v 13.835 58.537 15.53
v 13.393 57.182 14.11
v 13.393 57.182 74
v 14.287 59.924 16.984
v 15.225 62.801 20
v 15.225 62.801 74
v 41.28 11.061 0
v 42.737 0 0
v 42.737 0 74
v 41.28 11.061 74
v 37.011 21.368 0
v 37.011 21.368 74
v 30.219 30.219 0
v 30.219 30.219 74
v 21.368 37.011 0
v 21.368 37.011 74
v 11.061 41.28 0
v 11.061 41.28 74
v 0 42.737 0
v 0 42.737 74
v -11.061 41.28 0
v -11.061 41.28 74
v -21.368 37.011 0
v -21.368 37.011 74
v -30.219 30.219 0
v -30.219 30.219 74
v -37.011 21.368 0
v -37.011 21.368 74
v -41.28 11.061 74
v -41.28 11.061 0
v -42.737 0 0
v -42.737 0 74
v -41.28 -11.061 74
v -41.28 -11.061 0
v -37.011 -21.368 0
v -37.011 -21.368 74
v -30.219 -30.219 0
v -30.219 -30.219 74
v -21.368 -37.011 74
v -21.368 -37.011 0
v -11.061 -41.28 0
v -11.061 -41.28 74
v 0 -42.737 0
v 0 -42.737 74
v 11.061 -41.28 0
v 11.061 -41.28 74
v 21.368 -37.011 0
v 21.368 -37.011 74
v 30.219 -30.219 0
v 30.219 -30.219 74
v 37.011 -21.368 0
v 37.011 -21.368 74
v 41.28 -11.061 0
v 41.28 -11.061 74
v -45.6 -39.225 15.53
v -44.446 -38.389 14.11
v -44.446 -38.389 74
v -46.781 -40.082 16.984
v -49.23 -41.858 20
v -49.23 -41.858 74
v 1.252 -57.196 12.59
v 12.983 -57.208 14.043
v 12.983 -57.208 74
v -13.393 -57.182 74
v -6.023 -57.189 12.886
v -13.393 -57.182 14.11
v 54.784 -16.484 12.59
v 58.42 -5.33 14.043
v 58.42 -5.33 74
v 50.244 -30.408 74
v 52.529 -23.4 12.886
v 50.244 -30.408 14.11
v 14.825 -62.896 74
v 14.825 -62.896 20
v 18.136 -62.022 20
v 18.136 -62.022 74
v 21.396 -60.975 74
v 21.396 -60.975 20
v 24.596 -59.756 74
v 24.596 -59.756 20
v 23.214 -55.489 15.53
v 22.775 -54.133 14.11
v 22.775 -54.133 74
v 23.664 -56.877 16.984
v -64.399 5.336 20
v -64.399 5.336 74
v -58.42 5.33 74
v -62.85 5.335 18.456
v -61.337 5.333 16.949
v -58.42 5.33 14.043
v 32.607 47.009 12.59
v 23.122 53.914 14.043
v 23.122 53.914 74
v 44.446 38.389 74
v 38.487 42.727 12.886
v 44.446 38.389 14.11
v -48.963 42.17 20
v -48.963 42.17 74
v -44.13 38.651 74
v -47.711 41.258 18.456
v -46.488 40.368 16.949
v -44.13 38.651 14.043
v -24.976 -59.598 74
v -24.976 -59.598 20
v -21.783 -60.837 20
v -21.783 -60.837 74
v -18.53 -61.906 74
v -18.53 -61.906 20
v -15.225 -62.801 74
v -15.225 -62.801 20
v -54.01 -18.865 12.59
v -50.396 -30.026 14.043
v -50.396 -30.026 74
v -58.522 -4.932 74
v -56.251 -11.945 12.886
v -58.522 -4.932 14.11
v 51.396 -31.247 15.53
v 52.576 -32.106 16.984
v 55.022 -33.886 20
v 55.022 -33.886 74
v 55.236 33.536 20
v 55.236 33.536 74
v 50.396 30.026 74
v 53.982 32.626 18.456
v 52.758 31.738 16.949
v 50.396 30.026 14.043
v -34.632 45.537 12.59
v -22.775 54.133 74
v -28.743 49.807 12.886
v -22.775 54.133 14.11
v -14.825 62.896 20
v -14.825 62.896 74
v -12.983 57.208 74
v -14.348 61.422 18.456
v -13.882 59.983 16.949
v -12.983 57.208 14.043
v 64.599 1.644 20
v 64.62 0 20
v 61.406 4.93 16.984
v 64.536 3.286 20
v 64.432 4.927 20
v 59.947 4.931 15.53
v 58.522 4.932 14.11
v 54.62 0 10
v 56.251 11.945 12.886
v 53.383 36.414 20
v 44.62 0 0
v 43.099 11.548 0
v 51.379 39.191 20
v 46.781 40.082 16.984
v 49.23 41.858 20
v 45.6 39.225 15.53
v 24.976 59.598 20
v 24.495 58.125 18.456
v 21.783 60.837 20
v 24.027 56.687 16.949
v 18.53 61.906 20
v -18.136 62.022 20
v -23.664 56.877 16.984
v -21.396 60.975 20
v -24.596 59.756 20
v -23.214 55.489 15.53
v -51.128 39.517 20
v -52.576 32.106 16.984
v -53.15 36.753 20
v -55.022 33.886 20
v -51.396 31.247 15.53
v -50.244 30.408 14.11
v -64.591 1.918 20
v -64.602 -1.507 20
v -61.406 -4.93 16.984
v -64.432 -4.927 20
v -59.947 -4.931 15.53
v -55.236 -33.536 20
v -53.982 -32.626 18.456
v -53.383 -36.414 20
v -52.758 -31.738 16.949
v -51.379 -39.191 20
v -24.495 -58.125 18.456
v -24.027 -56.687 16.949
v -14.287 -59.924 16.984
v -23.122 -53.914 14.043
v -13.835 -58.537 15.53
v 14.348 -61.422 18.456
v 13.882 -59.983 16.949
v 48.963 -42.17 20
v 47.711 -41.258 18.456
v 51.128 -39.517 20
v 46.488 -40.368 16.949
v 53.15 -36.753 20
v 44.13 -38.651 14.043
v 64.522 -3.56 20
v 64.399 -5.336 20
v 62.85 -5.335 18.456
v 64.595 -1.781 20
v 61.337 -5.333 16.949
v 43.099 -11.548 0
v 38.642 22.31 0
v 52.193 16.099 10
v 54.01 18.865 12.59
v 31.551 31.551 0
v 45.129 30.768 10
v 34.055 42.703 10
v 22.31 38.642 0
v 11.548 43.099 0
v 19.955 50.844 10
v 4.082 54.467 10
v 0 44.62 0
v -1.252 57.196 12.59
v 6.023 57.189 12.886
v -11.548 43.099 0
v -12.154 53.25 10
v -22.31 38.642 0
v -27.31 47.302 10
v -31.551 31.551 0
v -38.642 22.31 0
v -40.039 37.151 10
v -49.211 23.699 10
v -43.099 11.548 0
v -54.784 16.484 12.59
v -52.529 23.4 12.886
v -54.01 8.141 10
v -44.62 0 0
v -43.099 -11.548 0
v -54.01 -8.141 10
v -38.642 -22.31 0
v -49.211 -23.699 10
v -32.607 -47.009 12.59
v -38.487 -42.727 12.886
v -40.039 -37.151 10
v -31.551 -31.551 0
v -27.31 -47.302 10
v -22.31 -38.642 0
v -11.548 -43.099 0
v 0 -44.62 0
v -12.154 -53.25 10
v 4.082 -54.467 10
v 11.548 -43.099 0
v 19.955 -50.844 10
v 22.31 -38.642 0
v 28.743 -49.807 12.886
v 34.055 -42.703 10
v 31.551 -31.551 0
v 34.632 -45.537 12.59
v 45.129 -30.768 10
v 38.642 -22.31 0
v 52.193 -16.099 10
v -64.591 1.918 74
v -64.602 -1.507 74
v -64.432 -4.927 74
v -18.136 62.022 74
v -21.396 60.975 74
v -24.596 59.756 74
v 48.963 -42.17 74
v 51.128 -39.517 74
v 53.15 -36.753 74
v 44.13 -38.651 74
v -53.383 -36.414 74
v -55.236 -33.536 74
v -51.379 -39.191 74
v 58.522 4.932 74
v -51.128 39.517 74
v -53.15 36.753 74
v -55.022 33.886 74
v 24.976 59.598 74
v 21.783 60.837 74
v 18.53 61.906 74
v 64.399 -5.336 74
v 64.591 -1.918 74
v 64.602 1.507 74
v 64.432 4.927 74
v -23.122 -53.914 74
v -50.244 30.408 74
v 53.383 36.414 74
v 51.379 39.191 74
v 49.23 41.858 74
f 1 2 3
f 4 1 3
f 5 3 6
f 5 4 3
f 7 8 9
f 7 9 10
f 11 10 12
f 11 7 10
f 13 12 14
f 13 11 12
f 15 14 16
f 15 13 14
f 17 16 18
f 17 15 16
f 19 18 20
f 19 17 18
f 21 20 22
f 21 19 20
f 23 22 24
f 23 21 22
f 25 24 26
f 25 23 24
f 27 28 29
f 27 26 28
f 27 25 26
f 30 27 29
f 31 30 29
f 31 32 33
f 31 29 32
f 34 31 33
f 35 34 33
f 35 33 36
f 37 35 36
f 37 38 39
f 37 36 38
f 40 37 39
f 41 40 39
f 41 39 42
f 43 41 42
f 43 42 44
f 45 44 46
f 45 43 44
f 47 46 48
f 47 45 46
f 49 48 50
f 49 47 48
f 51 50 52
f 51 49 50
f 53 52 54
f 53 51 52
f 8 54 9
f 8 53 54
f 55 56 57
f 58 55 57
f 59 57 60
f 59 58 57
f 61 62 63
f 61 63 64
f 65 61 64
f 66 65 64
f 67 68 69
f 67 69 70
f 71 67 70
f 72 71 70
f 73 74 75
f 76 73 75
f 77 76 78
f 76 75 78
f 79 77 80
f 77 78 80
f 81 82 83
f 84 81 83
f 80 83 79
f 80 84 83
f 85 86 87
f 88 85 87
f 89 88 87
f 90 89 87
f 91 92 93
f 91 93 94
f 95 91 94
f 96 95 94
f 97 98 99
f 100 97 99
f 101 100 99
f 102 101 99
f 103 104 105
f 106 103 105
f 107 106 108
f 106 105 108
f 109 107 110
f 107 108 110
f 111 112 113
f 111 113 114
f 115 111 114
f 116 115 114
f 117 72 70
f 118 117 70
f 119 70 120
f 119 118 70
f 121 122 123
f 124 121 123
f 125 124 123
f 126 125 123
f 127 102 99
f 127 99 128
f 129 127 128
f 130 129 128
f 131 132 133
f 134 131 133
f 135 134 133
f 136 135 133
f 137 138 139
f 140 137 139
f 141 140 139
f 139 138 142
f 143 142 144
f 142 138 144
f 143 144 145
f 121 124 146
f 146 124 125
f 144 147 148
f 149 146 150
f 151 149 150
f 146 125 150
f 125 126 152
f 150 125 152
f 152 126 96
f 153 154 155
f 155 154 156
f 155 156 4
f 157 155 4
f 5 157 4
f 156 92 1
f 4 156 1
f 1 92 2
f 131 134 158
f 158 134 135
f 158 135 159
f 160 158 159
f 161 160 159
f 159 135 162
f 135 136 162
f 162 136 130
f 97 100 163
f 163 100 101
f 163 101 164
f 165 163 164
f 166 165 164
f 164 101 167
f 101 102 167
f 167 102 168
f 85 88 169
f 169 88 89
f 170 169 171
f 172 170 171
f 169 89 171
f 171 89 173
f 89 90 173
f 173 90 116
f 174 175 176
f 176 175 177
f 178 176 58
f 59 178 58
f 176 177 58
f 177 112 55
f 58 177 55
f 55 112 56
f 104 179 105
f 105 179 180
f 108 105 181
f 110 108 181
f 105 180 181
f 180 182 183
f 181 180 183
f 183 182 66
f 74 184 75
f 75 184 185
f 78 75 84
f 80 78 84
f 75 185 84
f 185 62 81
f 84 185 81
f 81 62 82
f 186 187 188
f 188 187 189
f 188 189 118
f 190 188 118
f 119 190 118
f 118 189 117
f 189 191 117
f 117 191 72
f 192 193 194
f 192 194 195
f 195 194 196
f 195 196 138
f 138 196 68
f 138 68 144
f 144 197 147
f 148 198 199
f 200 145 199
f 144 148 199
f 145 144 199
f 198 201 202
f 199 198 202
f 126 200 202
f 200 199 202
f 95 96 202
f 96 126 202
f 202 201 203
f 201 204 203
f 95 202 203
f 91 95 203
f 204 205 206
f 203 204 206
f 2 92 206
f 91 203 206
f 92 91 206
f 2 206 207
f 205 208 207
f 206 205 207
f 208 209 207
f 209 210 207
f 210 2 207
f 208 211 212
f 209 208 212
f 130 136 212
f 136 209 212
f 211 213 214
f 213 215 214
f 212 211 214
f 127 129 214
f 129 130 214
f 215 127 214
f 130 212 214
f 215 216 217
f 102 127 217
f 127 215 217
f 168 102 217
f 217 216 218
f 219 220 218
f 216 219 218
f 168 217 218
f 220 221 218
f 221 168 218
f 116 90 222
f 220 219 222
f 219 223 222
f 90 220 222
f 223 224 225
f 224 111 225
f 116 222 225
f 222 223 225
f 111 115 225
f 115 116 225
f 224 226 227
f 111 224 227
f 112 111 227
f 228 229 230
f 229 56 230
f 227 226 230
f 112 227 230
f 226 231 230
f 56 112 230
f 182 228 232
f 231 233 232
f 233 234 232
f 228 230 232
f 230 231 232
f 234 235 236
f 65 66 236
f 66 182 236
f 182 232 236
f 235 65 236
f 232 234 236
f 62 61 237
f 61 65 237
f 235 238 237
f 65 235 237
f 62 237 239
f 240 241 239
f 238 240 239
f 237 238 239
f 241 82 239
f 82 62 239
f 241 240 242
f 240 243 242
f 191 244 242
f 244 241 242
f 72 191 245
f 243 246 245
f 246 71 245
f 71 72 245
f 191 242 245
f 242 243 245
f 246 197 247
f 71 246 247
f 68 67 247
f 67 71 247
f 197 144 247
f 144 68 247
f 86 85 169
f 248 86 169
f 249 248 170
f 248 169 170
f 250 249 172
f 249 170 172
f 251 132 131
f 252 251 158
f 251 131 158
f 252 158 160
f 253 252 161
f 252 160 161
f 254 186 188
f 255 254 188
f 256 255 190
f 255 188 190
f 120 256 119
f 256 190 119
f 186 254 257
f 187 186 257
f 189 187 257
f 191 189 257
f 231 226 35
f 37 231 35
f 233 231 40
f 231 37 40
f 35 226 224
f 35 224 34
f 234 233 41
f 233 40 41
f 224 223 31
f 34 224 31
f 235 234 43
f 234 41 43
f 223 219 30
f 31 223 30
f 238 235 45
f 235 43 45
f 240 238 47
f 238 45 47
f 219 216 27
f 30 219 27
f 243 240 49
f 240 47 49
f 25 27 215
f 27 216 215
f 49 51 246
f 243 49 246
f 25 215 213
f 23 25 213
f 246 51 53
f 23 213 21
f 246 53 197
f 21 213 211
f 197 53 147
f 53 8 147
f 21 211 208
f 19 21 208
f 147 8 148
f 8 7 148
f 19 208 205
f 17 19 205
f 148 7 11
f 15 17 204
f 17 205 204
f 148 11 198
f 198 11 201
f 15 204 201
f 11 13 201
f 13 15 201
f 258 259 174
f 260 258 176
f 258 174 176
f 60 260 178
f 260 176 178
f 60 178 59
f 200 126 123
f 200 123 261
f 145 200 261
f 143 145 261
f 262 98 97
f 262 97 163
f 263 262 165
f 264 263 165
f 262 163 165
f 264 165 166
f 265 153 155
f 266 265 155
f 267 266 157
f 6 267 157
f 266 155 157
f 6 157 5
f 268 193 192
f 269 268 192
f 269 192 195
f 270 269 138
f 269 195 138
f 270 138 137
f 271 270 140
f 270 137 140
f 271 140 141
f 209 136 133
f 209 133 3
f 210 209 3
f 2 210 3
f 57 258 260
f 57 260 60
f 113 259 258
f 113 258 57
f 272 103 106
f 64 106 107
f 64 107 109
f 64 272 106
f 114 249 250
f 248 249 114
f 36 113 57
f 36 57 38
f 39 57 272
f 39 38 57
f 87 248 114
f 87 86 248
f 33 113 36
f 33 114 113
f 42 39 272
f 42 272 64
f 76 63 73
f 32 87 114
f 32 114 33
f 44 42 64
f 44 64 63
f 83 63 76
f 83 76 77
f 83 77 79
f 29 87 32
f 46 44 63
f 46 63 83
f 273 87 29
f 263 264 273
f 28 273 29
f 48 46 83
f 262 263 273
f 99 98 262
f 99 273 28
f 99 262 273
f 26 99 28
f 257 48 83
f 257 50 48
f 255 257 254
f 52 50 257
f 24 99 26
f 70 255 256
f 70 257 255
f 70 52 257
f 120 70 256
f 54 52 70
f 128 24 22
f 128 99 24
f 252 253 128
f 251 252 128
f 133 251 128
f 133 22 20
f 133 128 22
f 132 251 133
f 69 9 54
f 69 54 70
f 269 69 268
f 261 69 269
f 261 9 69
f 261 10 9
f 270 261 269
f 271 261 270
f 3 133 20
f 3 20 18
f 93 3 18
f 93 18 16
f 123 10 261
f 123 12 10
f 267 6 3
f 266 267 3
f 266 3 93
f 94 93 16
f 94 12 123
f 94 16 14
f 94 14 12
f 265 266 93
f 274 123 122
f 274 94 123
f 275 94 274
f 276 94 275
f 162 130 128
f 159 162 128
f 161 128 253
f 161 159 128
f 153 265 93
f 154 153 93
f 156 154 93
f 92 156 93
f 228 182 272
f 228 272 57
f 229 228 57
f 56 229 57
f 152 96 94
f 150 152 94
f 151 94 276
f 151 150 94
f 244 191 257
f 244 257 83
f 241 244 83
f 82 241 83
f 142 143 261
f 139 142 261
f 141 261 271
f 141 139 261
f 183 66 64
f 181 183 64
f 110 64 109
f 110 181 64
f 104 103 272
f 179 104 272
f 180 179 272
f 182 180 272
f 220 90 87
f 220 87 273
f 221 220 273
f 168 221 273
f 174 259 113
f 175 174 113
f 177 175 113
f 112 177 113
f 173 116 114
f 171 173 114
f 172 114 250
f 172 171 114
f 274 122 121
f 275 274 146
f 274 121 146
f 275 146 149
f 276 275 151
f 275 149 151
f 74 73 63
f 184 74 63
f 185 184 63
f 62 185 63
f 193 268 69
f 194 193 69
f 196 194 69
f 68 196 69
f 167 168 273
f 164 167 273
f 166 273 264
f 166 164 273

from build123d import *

# Parameters (mm, degrees)
F0_R     = 64.619688
F2_DEPTH = 74
F1_R     = 42.736697
F3_DEPTH = 74.001
F4_SIZE  = 20
F6_DEPTH = 102


with BuildPart() as f2:
    # F0 (on Top) → F2 (new body)
    with BuildSketch(Plane.XY):
        Circle(F0_R)
    extrude(amount=F2_DEPTH)

    # F1 (on Top) → F3 (cut, through all)
    with BuildSketch(Plane.XY):
        Circle(F1_R)
    extrude(amount=F3_DEPTH, mode=Mode.SUBTRACT)

    # F4
    f4_edges = [f2.edges().sort_by_distance(p)[0] for p in [
        (-64.619688, 0, 0),
    ]]
    chamfer(f4_edges, length=F4_SIZE)

    # F5 (on Top) → F6 (cut)
    with BuildSketch(Plane.XY):
        Polygon((-21.568869, -82.25935), (-0.245193, -97.784208), (21.109202, -82.301633), (12.983269, -57.208017), (-13.393229, -57.181884), align=None)
        Polygon((22.775318, -54.133459), (30.901251, -79.227075), (57.27775, -79.253207), (65.453389, -54.175742), (44.129714, -38.650883), align=None)
        Polygon((50.244468, -30.407892), (71.568144, -45.93275), (92.922539, -30.450175), (84.796606, -5.356559), (58.420108, -5.330426), align=None)
        Polygon((58.521939, 4.932456), (84.898438, 4.906324), (93.074077, 29.983789), (71.750402, 45.508648), (50.396006, 30.026072), align=None)
        Polygon((44.446018, 38.388774), (65.800414, 53.871349), (57.674481, 78.964965), (31.297982, 78.991097), (23.122343, 53.913632), align=None)
        Polygon((13.393229, 57.181884), (21.568869, 82.25935), (0.245193, 97.784208), (-21.109202, 82.301633), (-12.983269, 57.208017), align=None)
        Polygon((-22.775318, 54.133459), (-30.901251, 79.227075), (-57.27775, 79.253207), (-65.453389, 54.175742), (-44.129714, 38.650883), align=None)
        Polygon((-50.244468, 30.407892), (-71.568144, 45.93275), (-92.922539, 30.450175), (-84.796606, 5.356559), (-58.420108, 5.330426), align=None)
        Polygon((-58.521939, -4.932456), (-84.898438, -4.906324), (-93.074077, -29.983789), (-71.750402, -45.508648), (-50.396006, -30.026072), align=None)
        Polygon((-44.446018, -38.388774), (-65.800414, -53.871349), (-57.674481, -78.964965), (-31.297982, -78.991097), (-23.122343, -53.913632), align=None)
    extrude(amount=F6_DEPTH, mode=Mode.SUBTRACT)


solid = f2.part
